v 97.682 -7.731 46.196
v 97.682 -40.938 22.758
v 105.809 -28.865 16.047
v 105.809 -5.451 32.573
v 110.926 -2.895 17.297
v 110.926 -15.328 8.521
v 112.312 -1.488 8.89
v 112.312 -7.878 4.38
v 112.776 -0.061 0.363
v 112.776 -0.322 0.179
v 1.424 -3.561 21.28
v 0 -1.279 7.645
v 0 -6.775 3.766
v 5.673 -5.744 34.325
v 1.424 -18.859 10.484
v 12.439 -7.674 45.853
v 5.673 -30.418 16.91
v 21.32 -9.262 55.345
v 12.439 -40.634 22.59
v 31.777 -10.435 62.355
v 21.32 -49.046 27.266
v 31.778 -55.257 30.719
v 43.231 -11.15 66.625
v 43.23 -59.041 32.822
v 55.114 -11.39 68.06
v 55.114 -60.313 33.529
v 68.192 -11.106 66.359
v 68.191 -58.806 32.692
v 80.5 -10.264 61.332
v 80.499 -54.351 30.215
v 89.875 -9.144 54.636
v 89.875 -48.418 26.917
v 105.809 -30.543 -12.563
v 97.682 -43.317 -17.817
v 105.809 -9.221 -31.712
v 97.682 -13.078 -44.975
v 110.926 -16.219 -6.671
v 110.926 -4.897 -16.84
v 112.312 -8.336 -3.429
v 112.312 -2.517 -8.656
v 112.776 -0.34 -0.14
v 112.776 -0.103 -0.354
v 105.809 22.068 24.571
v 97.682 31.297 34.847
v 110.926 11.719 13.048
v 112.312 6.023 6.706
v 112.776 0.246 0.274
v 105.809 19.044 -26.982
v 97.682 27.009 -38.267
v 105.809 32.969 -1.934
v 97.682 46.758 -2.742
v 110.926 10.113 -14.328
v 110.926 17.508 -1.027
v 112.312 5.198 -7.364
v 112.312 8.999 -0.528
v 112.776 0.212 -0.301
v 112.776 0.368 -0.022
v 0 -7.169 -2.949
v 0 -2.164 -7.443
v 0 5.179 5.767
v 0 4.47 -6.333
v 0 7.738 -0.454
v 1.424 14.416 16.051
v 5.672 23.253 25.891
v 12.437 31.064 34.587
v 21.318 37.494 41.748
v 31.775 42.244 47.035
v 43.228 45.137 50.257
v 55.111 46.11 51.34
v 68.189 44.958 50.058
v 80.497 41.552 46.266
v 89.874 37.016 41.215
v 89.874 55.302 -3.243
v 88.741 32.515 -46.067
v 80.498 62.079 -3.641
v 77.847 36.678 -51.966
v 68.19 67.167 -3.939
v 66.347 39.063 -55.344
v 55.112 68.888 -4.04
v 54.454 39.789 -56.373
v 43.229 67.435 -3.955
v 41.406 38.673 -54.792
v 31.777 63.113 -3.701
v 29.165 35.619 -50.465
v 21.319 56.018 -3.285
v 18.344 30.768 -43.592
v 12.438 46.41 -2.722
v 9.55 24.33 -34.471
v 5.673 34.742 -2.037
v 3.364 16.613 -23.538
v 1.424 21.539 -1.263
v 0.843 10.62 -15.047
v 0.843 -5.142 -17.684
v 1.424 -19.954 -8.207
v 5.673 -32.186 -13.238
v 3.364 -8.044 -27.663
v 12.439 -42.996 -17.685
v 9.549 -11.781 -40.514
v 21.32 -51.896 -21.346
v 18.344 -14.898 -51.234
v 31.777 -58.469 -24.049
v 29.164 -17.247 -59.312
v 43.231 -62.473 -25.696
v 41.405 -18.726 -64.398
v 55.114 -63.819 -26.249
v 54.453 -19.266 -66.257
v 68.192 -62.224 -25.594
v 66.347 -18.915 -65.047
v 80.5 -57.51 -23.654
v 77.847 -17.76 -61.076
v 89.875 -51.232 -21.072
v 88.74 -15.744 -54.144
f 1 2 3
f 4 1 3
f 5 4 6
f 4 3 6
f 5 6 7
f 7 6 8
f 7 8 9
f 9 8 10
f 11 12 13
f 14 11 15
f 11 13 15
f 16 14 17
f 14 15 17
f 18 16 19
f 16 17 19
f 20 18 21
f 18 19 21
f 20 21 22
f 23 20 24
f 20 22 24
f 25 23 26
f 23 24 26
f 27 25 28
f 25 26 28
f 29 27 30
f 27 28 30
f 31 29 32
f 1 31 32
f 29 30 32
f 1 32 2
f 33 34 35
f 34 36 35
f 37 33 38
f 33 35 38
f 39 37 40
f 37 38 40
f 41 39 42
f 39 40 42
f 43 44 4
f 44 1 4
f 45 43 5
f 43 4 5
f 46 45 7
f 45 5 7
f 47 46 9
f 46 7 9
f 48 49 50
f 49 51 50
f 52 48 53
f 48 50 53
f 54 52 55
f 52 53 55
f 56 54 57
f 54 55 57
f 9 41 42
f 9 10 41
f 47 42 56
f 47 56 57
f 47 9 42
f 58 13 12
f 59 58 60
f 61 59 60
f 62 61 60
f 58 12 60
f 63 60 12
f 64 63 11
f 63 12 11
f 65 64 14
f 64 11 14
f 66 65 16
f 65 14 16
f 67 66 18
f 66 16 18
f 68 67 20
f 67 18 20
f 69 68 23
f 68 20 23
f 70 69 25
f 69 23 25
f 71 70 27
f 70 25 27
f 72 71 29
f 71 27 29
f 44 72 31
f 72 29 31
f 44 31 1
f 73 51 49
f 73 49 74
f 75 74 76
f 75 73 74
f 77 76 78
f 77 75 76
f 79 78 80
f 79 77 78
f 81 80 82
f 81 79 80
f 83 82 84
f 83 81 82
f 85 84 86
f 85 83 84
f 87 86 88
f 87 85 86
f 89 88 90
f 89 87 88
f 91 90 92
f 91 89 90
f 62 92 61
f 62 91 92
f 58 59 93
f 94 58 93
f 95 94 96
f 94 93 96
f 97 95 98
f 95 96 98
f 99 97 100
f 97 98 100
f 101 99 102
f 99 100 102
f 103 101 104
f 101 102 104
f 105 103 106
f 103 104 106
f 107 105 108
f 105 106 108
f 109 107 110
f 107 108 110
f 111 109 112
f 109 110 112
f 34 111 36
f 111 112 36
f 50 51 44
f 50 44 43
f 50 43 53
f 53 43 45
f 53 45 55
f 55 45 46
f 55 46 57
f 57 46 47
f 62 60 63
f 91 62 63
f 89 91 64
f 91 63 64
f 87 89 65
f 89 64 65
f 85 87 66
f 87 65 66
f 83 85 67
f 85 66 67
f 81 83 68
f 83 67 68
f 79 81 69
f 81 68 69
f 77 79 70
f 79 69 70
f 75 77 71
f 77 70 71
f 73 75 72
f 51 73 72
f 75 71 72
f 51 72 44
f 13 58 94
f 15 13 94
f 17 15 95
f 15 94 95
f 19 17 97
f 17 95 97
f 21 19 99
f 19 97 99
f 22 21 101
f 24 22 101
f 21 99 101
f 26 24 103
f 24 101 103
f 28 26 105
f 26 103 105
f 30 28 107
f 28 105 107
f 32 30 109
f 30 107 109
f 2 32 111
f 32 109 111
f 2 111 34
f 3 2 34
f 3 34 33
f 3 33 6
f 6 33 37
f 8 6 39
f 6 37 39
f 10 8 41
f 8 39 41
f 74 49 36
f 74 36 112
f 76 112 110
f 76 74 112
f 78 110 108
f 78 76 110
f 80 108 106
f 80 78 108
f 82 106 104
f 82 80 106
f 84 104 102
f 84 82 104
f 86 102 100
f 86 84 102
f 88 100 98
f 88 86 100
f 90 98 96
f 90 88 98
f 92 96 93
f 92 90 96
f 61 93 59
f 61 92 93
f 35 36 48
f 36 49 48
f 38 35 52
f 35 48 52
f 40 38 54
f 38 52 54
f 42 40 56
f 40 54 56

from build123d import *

# Parameters (mm, degrees)
F2_DEPTH = 112.776
F3_R     = 65.613496
F4_R     = 55.188922


with BuildPart() as f2:
    # F1 (on face) → F2 (new body)
    with BuildSketch(Plane.YZ):
        Polygon((42.206959, -59.798696), (73.068112, -4.285148), (48.907486, 54.455204), (-12.081474, 72.189677), (-63.972838, 35.563851), (-67.69135, -27.84228), (-20.436895, -70.282606), align=None)
    extrude(amount=F2_DEPTH)

    # F3
    f3_edges = [f2.edges().sort_by_distance(p)[0] for p in [
        (112.776, -44.064122, -49.062443),
        (112.776, 10.885032, -65.040651),
        (112.776, 57.637535, -32.041922),
        (112.776, 60.987799, 25.085028),
        (112.776, 18.413006, 63.32244),
        (112.776, -38.027156, 53.876764),
        (112.776, -65.832094, 3.860785),
    ]]
    fillet(f3_edges, radius=F3_R)

    # F4
    f4_edges = [f2.edges().sort_by_distance(p)[0] for p in [
        (0, -65.832094, 3.860785),
        (0, -38.027156, 53.876764),
        (0, 18.413006, 63.32244),
        (0, 60.987799, 25.085028),
        (0, 57.637535, -32.041922),
        (0, 10.885032, -65.040651),
        (0, -44.064122, -49.062443),
    ]]
    fillet(f4_edges, radius=F4_R)


solid = f2.part
